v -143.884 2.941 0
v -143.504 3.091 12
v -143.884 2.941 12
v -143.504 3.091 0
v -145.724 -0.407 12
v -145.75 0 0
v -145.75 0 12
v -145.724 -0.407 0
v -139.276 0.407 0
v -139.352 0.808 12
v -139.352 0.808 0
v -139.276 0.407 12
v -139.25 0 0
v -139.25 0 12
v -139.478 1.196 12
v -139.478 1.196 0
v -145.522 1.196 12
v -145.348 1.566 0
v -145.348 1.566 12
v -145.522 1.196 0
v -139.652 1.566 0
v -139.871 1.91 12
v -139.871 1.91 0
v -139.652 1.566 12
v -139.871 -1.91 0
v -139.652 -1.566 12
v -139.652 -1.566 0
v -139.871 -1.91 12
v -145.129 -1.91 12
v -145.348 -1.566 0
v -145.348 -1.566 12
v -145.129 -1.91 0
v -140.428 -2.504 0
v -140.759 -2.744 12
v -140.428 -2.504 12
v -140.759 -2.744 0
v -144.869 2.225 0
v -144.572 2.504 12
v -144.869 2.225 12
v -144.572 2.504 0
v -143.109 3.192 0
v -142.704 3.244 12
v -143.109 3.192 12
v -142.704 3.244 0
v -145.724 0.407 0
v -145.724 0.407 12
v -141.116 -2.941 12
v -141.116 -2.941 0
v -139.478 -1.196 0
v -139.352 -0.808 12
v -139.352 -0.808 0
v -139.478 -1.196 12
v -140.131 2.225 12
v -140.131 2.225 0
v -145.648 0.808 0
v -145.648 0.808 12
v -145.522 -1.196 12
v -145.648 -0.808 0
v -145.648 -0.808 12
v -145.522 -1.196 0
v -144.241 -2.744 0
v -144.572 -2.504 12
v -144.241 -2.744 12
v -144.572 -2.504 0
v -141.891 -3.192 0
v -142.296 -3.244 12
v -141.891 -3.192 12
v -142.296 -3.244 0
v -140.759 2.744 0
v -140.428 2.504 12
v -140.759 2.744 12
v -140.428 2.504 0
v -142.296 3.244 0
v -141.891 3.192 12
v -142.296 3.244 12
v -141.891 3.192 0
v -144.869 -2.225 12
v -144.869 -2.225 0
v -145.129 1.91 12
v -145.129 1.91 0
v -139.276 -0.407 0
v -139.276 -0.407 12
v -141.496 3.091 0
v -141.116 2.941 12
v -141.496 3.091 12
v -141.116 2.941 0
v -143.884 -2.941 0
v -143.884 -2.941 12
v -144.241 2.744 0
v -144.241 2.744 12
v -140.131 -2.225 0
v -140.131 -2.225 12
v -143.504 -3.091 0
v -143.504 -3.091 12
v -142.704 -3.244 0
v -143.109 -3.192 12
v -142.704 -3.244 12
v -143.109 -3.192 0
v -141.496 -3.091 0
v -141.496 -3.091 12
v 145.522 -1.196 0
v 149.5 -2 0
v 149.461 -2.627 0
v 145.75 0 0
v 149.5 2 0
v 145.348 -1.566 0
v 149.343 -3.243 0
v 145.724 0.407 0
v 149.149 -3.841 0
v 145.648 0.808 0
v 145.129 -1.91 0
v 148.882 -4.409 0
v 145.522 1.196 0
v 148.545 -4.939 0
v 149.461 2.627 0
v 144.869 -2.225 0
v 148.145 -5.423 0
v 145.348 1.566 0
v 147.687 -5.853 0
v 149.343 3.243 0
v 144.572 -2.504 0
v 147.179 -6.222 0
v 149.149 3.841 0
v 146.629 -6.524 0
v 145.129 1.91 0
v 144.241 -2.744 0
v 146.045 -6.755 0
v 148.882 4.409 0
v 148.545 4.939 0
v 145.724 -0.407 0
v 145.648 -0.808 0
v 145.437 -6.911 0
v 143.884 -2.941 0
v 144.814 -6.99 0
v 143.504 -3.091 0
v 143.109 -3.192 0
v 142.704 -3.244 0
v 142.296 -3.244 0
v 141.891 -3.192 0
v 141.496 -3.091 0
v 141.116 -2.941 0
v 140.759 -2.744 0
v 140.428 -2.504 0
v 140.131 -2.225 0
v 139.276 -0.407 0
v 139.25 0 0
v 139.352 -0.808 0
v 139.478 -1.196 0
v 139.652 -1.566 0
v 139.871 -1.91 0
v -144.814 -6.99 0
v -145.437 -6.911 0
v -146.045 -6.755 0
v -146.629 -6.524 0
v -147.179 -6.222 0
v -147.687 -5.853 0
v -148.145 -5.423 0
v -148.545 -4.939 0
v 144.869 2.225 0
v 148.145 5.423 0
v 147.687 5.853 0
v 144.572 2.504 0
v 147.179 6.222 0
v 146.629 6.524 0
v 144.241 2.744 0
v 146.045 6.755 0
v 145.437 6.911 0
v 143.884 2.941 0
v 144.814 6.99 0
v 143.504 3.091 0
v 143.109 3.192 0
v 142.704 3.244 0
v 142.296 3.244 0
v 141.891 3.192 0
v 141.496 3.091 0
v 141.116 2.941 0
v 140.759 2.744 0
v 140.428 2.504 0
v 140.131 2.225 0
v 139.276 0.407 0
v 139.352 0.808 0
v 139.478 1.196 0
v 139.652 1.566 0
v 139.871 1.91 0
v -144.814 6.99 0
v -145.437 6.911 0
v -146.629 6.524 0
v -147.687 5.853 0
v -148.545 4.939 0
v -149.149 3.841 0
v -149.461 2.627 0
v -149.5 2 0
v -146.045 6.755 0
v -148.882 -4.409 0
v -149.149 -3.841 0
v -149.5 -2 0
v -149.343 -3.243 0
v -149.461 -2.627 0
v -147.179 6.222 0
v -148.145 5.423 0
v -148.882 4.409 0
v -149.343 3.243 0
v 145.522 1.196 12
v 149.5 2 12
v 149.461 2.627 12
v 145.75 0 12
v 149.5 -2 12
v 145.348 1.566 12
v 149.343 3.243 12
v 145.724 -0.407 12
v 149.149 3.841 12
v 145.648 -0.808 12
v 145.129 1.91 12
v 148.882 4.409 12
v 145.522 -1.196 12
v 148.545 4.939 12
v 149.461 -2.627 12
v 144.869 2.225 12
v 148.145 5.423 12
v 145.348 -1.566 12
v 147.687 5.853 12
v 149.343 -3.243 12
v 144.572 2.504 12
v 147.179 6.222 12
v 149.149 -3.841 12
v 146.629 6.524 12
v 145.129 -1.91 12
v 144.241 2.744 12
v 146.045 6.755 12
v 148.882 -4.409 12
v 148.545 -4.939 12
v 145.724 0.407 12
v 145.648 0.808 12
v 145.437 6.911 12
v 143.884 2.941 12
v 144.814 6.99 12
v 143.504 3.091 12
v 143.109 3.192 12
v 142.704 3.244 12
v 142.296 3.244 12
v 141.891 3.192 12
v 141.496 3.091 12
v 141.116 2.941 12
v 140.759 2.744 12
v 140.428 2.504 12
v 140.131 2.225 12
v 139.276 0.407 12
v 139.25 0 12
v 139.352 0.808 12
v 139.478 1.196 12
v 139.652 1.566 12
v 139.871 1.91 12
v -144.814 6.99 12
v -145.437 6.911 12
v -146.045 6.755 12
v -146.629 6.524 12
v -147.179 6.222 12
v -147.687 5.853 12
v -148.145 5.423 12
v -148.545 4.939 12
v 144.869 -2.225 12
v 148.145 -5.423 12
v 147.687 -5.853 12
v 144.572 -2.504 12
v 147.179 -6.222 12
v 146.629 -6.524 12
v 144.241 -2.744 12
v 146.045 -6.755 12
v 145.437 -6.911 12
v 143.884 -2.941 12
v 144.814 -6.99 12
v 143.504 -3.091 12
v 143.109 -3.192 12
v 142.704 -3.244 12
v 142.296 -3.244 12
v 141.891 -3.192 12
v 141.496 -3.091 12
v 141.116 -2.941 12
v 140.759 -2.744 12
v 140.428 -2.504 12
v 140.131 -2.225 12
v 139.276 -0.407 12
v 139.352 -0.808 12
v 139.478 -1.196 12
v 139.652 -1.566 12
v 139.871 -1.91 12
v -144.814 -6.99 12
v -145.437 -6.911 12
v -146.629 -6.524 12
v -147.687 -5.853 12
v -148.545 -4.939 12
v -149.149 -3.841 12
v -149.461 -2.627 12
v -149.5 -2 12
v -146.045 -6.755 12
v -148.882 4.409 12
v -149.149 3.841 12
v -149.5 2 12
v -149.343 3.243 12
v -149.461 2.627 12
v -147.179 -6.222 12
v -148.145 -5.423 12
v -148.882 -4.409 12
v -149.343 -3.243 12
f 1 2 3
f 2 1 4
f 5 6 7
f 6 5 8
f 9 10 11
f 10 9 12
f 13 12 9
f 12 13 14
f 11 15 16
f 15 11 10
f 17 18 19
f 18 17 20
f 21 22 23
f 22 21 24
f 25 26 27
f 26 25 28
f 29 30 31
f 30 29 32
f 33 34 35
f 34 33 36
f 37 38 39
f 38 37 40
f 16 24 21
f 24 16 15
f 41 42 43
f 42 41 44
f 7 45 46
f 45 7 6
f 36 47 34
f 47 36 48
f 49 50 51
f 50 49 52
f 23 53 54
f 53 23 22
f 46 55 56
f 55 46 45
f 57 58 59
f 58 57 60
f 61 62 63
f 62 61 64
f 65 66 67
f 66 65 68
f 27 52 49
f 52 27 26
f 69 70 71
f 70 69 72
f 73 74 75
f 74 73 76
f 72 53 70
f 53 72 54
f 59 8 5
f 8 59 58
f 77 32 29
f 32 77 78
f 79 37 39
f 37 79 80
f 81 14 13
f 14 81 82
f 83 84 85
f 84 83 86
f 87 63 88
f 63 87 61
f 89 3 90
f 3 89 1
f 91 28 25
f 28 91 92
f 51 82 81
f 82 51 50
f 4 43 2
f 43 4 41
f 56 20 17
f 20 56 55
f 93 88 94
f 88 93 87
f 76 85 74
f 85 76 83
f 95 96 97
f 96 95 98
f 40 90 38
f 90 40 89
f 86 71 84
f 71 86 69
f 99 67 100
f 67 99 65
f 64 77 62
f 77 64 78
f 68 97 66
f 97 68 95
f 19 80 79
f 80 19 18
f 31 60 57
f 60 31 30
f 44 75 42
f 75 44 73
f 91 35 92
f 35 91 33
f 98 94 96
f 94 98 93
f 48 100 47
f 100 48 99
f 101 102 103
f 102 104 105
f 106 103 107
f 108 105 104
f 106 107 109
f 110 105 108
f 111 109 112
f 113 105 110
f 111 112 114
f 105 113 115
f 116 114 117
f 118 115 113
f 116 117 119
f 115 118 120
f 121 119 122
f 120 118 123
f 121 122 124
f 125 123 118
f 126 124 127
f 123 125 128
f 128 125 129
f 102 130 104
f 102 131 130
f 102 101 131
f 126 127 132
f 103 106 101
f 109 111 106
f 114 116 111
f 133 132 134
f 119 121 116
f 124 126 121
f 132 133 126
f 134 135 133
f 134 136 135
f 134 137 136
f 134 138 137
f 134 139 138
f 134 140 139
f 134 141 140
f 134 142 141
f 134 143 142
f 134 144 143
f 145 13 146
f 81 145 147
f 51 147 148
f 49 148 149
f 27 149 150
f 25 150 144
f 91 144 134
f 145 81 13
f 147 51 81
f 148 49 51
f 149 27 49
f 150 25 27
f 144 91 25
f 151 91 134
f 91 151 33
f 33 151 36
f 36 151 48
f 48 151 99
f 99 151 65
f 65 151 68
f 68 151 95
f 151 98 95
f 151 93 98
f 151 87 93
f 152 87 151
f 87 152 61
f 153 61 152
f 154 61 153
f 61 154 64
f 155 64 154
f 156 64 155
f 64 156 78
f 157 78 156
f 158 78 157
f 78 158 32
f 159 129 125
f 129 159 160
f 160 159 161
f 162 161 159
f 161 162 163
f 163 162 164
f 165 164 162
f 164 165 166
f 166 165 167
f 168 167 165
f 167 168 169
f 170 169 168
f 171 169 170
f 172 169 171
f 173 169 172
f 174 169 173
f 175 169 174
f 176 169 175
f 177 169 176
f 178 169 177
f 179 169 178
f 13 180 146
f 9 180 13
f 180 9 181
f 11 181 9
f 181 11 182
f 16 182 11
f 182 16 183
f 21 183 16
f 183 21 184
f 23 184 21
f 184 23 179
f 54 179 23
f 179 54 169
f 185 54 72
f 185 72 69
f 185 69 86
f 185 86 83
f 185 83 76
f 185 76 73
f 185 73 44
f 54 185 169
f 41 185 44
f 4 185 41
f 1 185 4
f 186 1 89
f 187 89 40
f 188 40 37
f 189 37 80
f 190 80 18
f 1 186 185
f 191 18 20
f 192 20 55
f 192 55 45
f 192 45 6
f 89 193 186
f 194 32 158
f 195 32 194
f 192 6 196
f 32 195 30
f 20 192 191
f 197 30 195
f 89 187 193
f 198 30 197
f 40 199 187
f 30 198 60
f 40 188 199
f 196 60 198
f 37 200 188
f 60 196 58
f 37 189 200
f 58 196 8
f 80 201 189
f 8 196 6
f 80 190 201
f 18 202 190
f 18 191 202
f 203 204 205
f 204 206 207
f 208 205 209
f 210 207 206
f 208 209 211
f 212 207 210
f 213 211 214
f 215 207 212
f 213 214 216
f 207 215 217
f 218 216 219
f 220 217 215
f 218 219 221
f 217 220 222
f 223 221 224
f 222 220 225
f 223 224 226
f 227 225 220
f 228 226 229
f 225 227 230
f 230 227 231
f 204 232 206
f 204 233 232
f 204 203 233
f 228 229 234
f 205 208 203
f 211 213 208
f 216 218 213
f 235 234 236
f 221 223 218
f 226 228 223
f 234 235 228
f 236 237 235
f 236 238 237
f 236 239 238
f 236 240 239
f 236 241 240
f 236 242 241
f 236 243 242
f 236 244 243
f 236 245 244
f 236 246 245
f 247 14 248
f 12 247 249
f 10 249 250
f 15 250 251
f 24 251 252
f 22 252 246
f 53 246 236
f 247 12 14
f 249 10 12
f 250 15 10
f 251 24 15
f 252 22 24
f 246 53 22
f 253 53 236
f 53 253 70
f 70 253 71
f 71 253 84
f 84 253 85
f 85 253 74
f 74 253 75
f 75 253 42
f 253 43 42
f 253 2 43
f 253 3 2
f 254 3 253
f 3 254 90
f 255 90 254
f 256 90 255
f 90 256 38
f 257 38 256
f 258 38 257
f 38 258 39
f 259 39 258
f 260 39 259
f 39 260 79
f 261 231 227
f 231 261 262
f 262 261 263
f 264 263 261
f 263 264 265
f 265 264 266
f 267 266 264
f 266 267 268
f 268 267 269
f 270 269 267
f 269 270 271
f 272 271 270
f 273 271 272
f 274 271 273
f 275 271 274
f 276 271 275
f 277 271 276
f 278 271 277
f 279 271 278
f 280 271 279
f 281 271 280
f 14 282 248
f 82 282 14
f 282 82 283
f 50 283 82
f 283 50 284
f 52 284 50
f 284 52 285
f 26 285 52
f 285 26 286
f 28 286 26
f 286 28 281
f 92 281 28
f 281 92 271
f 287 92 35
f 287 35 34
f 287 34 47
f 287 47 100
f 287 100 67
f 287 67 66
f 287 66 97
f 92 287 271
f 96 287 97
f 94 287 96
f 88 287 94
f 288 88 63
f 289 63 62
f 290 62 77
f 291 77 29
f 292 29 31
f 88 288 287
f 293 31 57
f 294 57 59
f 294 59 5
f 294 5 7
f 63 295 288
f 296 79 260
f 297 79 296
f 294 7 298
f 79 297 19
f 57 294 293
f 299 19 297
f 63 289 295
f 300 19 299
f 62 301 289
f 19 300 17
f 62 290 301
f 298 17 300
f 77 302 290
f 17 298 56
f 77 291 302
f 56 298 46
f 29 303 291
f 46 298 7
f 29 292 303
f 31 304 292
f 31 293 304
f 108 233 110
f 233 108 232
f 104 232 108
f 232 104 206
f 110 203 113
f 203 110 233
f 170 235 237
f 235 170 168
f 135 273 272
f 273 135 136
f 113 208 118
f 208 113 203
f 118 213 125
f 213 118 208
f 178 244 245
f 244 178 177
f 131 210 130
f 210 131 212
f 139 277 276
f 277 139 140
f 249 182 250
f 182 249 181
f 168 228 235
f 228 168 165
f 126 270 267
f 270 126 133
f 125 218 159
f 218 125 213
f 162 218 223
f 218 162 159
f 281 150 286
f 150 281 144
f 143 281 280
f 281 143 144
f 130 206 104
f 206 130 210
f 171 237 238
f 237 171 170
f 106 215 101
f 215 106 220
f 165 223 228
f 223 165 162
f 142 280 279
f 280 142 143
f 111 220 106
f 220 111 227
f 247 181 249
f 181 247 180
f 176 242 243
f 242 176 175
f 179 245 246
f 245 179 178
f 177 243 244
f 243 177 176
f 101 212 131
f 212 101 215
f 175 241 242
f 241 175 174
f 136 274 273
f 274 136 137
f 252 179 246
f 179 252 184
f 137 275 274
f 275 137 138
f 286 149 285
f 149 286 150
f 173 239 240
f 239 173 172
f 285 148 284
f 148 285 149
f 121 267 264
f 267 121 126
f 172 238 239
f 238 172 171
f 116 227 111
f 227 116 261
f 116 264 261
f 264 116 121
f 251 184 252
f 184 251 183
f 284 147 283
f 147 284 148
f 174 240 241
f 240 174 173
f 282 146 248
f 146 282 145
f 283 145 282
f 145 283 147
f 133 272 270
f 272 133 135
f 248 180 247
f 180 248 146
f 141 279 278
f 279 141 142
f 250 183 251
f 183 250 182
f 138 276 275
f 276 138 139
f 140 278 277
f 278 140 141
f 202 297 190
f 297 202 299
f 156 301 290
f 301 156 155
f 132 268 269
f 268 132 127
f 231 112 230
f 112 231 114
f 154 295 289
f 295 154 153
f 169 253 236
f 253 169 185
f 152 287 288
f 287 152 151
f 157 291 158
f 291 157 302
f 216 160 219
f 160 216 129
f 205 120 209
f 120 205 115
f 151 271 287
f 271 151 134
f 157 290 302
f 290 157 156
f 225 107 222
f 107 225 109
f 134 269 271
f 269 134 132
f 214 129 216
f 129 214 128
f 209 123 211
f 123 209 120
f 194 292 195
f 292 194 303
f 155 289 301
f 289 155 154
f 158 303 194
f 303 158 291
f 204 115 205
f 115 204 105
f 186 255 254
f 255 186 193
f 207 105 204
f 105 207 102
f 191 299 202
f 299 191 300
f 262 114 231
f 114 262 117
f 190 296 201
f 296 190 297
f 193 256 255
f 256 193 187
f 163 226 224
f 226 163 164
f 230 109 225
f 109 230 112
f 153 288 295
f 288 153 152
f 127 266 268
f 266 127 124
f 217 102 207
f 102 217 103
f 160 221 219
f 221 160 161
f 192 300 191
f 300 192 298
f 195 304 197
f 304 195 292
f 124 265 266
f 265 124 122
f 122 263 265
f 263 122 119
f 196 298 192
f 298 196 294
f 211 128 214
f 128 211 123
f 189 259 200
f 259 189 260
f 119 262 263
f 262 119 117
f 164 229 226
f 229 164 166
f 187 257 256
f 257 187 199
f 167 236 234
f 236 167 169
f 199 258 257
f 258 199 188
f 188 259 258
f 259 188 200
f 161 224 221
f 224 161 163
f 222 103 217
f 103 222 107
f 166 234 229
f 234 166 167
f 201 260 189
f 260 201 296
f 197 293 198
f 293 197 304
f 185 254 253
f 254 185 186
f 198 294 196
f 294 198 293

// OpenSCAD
$fn = 50;


difference() {
	union() {
		hull() {
			translate(v = [-144.5000000000, 2.0000000000, 0]) {
				cylinder(h = 12, r = 5);
			}
			translate(v = [144.5000000000, 2.0000000000, 0]) {
				cylinder(h = 12, r = 5);
			}
			translate(v = [-144.5000000000, -2.0000000000, 0]) {
				cylinder(h = 12, r = 5);
			}
			translate(v = [144.5000000000, -2.0000000000, 0]) {
				cylinder(h = 12, r = 5);
			}
		}
	}
	union() {
		translate(v = [-142.5000000000, 0.0000000000, 0]) {
			cylinder(h = 12, r = 3.2500000000);
		}
		translate(v = [142.5000000000, 0.0000000000, 0]) {
			cylinder(h = 12, r = 3.2500000000);
		}
		translate(v = [-142.5000000000, 0.0000000000, 0]) {
			cylinder(h = 12, r = 1.8000000000);
		}
		translate(v = [142.5000000000, 0.0000000000, 0]) {
			cylinder(h = 12, r = 1.8000000000);
		}
		translate(v = [-142.5000000000, 0.0000000000, 0]) {
			cylinder(h = 12, r = 1.8000000000);
		}
		translate(v = [142.5000000000, 0.0000000000, 0]) {
			cylinder(h = 12, r = 1.8000000000);
		}
		translate(v = [-142.5000000000, 0.0000000000, 0]) {
			cylinder(h = 12, r = 1.8000000000);
		}
		translate(v = [142.5000000000, 0.0000000000, 0]) {
			cylinder(h = 12, r = 1.8000000000);
		}
	}
}
